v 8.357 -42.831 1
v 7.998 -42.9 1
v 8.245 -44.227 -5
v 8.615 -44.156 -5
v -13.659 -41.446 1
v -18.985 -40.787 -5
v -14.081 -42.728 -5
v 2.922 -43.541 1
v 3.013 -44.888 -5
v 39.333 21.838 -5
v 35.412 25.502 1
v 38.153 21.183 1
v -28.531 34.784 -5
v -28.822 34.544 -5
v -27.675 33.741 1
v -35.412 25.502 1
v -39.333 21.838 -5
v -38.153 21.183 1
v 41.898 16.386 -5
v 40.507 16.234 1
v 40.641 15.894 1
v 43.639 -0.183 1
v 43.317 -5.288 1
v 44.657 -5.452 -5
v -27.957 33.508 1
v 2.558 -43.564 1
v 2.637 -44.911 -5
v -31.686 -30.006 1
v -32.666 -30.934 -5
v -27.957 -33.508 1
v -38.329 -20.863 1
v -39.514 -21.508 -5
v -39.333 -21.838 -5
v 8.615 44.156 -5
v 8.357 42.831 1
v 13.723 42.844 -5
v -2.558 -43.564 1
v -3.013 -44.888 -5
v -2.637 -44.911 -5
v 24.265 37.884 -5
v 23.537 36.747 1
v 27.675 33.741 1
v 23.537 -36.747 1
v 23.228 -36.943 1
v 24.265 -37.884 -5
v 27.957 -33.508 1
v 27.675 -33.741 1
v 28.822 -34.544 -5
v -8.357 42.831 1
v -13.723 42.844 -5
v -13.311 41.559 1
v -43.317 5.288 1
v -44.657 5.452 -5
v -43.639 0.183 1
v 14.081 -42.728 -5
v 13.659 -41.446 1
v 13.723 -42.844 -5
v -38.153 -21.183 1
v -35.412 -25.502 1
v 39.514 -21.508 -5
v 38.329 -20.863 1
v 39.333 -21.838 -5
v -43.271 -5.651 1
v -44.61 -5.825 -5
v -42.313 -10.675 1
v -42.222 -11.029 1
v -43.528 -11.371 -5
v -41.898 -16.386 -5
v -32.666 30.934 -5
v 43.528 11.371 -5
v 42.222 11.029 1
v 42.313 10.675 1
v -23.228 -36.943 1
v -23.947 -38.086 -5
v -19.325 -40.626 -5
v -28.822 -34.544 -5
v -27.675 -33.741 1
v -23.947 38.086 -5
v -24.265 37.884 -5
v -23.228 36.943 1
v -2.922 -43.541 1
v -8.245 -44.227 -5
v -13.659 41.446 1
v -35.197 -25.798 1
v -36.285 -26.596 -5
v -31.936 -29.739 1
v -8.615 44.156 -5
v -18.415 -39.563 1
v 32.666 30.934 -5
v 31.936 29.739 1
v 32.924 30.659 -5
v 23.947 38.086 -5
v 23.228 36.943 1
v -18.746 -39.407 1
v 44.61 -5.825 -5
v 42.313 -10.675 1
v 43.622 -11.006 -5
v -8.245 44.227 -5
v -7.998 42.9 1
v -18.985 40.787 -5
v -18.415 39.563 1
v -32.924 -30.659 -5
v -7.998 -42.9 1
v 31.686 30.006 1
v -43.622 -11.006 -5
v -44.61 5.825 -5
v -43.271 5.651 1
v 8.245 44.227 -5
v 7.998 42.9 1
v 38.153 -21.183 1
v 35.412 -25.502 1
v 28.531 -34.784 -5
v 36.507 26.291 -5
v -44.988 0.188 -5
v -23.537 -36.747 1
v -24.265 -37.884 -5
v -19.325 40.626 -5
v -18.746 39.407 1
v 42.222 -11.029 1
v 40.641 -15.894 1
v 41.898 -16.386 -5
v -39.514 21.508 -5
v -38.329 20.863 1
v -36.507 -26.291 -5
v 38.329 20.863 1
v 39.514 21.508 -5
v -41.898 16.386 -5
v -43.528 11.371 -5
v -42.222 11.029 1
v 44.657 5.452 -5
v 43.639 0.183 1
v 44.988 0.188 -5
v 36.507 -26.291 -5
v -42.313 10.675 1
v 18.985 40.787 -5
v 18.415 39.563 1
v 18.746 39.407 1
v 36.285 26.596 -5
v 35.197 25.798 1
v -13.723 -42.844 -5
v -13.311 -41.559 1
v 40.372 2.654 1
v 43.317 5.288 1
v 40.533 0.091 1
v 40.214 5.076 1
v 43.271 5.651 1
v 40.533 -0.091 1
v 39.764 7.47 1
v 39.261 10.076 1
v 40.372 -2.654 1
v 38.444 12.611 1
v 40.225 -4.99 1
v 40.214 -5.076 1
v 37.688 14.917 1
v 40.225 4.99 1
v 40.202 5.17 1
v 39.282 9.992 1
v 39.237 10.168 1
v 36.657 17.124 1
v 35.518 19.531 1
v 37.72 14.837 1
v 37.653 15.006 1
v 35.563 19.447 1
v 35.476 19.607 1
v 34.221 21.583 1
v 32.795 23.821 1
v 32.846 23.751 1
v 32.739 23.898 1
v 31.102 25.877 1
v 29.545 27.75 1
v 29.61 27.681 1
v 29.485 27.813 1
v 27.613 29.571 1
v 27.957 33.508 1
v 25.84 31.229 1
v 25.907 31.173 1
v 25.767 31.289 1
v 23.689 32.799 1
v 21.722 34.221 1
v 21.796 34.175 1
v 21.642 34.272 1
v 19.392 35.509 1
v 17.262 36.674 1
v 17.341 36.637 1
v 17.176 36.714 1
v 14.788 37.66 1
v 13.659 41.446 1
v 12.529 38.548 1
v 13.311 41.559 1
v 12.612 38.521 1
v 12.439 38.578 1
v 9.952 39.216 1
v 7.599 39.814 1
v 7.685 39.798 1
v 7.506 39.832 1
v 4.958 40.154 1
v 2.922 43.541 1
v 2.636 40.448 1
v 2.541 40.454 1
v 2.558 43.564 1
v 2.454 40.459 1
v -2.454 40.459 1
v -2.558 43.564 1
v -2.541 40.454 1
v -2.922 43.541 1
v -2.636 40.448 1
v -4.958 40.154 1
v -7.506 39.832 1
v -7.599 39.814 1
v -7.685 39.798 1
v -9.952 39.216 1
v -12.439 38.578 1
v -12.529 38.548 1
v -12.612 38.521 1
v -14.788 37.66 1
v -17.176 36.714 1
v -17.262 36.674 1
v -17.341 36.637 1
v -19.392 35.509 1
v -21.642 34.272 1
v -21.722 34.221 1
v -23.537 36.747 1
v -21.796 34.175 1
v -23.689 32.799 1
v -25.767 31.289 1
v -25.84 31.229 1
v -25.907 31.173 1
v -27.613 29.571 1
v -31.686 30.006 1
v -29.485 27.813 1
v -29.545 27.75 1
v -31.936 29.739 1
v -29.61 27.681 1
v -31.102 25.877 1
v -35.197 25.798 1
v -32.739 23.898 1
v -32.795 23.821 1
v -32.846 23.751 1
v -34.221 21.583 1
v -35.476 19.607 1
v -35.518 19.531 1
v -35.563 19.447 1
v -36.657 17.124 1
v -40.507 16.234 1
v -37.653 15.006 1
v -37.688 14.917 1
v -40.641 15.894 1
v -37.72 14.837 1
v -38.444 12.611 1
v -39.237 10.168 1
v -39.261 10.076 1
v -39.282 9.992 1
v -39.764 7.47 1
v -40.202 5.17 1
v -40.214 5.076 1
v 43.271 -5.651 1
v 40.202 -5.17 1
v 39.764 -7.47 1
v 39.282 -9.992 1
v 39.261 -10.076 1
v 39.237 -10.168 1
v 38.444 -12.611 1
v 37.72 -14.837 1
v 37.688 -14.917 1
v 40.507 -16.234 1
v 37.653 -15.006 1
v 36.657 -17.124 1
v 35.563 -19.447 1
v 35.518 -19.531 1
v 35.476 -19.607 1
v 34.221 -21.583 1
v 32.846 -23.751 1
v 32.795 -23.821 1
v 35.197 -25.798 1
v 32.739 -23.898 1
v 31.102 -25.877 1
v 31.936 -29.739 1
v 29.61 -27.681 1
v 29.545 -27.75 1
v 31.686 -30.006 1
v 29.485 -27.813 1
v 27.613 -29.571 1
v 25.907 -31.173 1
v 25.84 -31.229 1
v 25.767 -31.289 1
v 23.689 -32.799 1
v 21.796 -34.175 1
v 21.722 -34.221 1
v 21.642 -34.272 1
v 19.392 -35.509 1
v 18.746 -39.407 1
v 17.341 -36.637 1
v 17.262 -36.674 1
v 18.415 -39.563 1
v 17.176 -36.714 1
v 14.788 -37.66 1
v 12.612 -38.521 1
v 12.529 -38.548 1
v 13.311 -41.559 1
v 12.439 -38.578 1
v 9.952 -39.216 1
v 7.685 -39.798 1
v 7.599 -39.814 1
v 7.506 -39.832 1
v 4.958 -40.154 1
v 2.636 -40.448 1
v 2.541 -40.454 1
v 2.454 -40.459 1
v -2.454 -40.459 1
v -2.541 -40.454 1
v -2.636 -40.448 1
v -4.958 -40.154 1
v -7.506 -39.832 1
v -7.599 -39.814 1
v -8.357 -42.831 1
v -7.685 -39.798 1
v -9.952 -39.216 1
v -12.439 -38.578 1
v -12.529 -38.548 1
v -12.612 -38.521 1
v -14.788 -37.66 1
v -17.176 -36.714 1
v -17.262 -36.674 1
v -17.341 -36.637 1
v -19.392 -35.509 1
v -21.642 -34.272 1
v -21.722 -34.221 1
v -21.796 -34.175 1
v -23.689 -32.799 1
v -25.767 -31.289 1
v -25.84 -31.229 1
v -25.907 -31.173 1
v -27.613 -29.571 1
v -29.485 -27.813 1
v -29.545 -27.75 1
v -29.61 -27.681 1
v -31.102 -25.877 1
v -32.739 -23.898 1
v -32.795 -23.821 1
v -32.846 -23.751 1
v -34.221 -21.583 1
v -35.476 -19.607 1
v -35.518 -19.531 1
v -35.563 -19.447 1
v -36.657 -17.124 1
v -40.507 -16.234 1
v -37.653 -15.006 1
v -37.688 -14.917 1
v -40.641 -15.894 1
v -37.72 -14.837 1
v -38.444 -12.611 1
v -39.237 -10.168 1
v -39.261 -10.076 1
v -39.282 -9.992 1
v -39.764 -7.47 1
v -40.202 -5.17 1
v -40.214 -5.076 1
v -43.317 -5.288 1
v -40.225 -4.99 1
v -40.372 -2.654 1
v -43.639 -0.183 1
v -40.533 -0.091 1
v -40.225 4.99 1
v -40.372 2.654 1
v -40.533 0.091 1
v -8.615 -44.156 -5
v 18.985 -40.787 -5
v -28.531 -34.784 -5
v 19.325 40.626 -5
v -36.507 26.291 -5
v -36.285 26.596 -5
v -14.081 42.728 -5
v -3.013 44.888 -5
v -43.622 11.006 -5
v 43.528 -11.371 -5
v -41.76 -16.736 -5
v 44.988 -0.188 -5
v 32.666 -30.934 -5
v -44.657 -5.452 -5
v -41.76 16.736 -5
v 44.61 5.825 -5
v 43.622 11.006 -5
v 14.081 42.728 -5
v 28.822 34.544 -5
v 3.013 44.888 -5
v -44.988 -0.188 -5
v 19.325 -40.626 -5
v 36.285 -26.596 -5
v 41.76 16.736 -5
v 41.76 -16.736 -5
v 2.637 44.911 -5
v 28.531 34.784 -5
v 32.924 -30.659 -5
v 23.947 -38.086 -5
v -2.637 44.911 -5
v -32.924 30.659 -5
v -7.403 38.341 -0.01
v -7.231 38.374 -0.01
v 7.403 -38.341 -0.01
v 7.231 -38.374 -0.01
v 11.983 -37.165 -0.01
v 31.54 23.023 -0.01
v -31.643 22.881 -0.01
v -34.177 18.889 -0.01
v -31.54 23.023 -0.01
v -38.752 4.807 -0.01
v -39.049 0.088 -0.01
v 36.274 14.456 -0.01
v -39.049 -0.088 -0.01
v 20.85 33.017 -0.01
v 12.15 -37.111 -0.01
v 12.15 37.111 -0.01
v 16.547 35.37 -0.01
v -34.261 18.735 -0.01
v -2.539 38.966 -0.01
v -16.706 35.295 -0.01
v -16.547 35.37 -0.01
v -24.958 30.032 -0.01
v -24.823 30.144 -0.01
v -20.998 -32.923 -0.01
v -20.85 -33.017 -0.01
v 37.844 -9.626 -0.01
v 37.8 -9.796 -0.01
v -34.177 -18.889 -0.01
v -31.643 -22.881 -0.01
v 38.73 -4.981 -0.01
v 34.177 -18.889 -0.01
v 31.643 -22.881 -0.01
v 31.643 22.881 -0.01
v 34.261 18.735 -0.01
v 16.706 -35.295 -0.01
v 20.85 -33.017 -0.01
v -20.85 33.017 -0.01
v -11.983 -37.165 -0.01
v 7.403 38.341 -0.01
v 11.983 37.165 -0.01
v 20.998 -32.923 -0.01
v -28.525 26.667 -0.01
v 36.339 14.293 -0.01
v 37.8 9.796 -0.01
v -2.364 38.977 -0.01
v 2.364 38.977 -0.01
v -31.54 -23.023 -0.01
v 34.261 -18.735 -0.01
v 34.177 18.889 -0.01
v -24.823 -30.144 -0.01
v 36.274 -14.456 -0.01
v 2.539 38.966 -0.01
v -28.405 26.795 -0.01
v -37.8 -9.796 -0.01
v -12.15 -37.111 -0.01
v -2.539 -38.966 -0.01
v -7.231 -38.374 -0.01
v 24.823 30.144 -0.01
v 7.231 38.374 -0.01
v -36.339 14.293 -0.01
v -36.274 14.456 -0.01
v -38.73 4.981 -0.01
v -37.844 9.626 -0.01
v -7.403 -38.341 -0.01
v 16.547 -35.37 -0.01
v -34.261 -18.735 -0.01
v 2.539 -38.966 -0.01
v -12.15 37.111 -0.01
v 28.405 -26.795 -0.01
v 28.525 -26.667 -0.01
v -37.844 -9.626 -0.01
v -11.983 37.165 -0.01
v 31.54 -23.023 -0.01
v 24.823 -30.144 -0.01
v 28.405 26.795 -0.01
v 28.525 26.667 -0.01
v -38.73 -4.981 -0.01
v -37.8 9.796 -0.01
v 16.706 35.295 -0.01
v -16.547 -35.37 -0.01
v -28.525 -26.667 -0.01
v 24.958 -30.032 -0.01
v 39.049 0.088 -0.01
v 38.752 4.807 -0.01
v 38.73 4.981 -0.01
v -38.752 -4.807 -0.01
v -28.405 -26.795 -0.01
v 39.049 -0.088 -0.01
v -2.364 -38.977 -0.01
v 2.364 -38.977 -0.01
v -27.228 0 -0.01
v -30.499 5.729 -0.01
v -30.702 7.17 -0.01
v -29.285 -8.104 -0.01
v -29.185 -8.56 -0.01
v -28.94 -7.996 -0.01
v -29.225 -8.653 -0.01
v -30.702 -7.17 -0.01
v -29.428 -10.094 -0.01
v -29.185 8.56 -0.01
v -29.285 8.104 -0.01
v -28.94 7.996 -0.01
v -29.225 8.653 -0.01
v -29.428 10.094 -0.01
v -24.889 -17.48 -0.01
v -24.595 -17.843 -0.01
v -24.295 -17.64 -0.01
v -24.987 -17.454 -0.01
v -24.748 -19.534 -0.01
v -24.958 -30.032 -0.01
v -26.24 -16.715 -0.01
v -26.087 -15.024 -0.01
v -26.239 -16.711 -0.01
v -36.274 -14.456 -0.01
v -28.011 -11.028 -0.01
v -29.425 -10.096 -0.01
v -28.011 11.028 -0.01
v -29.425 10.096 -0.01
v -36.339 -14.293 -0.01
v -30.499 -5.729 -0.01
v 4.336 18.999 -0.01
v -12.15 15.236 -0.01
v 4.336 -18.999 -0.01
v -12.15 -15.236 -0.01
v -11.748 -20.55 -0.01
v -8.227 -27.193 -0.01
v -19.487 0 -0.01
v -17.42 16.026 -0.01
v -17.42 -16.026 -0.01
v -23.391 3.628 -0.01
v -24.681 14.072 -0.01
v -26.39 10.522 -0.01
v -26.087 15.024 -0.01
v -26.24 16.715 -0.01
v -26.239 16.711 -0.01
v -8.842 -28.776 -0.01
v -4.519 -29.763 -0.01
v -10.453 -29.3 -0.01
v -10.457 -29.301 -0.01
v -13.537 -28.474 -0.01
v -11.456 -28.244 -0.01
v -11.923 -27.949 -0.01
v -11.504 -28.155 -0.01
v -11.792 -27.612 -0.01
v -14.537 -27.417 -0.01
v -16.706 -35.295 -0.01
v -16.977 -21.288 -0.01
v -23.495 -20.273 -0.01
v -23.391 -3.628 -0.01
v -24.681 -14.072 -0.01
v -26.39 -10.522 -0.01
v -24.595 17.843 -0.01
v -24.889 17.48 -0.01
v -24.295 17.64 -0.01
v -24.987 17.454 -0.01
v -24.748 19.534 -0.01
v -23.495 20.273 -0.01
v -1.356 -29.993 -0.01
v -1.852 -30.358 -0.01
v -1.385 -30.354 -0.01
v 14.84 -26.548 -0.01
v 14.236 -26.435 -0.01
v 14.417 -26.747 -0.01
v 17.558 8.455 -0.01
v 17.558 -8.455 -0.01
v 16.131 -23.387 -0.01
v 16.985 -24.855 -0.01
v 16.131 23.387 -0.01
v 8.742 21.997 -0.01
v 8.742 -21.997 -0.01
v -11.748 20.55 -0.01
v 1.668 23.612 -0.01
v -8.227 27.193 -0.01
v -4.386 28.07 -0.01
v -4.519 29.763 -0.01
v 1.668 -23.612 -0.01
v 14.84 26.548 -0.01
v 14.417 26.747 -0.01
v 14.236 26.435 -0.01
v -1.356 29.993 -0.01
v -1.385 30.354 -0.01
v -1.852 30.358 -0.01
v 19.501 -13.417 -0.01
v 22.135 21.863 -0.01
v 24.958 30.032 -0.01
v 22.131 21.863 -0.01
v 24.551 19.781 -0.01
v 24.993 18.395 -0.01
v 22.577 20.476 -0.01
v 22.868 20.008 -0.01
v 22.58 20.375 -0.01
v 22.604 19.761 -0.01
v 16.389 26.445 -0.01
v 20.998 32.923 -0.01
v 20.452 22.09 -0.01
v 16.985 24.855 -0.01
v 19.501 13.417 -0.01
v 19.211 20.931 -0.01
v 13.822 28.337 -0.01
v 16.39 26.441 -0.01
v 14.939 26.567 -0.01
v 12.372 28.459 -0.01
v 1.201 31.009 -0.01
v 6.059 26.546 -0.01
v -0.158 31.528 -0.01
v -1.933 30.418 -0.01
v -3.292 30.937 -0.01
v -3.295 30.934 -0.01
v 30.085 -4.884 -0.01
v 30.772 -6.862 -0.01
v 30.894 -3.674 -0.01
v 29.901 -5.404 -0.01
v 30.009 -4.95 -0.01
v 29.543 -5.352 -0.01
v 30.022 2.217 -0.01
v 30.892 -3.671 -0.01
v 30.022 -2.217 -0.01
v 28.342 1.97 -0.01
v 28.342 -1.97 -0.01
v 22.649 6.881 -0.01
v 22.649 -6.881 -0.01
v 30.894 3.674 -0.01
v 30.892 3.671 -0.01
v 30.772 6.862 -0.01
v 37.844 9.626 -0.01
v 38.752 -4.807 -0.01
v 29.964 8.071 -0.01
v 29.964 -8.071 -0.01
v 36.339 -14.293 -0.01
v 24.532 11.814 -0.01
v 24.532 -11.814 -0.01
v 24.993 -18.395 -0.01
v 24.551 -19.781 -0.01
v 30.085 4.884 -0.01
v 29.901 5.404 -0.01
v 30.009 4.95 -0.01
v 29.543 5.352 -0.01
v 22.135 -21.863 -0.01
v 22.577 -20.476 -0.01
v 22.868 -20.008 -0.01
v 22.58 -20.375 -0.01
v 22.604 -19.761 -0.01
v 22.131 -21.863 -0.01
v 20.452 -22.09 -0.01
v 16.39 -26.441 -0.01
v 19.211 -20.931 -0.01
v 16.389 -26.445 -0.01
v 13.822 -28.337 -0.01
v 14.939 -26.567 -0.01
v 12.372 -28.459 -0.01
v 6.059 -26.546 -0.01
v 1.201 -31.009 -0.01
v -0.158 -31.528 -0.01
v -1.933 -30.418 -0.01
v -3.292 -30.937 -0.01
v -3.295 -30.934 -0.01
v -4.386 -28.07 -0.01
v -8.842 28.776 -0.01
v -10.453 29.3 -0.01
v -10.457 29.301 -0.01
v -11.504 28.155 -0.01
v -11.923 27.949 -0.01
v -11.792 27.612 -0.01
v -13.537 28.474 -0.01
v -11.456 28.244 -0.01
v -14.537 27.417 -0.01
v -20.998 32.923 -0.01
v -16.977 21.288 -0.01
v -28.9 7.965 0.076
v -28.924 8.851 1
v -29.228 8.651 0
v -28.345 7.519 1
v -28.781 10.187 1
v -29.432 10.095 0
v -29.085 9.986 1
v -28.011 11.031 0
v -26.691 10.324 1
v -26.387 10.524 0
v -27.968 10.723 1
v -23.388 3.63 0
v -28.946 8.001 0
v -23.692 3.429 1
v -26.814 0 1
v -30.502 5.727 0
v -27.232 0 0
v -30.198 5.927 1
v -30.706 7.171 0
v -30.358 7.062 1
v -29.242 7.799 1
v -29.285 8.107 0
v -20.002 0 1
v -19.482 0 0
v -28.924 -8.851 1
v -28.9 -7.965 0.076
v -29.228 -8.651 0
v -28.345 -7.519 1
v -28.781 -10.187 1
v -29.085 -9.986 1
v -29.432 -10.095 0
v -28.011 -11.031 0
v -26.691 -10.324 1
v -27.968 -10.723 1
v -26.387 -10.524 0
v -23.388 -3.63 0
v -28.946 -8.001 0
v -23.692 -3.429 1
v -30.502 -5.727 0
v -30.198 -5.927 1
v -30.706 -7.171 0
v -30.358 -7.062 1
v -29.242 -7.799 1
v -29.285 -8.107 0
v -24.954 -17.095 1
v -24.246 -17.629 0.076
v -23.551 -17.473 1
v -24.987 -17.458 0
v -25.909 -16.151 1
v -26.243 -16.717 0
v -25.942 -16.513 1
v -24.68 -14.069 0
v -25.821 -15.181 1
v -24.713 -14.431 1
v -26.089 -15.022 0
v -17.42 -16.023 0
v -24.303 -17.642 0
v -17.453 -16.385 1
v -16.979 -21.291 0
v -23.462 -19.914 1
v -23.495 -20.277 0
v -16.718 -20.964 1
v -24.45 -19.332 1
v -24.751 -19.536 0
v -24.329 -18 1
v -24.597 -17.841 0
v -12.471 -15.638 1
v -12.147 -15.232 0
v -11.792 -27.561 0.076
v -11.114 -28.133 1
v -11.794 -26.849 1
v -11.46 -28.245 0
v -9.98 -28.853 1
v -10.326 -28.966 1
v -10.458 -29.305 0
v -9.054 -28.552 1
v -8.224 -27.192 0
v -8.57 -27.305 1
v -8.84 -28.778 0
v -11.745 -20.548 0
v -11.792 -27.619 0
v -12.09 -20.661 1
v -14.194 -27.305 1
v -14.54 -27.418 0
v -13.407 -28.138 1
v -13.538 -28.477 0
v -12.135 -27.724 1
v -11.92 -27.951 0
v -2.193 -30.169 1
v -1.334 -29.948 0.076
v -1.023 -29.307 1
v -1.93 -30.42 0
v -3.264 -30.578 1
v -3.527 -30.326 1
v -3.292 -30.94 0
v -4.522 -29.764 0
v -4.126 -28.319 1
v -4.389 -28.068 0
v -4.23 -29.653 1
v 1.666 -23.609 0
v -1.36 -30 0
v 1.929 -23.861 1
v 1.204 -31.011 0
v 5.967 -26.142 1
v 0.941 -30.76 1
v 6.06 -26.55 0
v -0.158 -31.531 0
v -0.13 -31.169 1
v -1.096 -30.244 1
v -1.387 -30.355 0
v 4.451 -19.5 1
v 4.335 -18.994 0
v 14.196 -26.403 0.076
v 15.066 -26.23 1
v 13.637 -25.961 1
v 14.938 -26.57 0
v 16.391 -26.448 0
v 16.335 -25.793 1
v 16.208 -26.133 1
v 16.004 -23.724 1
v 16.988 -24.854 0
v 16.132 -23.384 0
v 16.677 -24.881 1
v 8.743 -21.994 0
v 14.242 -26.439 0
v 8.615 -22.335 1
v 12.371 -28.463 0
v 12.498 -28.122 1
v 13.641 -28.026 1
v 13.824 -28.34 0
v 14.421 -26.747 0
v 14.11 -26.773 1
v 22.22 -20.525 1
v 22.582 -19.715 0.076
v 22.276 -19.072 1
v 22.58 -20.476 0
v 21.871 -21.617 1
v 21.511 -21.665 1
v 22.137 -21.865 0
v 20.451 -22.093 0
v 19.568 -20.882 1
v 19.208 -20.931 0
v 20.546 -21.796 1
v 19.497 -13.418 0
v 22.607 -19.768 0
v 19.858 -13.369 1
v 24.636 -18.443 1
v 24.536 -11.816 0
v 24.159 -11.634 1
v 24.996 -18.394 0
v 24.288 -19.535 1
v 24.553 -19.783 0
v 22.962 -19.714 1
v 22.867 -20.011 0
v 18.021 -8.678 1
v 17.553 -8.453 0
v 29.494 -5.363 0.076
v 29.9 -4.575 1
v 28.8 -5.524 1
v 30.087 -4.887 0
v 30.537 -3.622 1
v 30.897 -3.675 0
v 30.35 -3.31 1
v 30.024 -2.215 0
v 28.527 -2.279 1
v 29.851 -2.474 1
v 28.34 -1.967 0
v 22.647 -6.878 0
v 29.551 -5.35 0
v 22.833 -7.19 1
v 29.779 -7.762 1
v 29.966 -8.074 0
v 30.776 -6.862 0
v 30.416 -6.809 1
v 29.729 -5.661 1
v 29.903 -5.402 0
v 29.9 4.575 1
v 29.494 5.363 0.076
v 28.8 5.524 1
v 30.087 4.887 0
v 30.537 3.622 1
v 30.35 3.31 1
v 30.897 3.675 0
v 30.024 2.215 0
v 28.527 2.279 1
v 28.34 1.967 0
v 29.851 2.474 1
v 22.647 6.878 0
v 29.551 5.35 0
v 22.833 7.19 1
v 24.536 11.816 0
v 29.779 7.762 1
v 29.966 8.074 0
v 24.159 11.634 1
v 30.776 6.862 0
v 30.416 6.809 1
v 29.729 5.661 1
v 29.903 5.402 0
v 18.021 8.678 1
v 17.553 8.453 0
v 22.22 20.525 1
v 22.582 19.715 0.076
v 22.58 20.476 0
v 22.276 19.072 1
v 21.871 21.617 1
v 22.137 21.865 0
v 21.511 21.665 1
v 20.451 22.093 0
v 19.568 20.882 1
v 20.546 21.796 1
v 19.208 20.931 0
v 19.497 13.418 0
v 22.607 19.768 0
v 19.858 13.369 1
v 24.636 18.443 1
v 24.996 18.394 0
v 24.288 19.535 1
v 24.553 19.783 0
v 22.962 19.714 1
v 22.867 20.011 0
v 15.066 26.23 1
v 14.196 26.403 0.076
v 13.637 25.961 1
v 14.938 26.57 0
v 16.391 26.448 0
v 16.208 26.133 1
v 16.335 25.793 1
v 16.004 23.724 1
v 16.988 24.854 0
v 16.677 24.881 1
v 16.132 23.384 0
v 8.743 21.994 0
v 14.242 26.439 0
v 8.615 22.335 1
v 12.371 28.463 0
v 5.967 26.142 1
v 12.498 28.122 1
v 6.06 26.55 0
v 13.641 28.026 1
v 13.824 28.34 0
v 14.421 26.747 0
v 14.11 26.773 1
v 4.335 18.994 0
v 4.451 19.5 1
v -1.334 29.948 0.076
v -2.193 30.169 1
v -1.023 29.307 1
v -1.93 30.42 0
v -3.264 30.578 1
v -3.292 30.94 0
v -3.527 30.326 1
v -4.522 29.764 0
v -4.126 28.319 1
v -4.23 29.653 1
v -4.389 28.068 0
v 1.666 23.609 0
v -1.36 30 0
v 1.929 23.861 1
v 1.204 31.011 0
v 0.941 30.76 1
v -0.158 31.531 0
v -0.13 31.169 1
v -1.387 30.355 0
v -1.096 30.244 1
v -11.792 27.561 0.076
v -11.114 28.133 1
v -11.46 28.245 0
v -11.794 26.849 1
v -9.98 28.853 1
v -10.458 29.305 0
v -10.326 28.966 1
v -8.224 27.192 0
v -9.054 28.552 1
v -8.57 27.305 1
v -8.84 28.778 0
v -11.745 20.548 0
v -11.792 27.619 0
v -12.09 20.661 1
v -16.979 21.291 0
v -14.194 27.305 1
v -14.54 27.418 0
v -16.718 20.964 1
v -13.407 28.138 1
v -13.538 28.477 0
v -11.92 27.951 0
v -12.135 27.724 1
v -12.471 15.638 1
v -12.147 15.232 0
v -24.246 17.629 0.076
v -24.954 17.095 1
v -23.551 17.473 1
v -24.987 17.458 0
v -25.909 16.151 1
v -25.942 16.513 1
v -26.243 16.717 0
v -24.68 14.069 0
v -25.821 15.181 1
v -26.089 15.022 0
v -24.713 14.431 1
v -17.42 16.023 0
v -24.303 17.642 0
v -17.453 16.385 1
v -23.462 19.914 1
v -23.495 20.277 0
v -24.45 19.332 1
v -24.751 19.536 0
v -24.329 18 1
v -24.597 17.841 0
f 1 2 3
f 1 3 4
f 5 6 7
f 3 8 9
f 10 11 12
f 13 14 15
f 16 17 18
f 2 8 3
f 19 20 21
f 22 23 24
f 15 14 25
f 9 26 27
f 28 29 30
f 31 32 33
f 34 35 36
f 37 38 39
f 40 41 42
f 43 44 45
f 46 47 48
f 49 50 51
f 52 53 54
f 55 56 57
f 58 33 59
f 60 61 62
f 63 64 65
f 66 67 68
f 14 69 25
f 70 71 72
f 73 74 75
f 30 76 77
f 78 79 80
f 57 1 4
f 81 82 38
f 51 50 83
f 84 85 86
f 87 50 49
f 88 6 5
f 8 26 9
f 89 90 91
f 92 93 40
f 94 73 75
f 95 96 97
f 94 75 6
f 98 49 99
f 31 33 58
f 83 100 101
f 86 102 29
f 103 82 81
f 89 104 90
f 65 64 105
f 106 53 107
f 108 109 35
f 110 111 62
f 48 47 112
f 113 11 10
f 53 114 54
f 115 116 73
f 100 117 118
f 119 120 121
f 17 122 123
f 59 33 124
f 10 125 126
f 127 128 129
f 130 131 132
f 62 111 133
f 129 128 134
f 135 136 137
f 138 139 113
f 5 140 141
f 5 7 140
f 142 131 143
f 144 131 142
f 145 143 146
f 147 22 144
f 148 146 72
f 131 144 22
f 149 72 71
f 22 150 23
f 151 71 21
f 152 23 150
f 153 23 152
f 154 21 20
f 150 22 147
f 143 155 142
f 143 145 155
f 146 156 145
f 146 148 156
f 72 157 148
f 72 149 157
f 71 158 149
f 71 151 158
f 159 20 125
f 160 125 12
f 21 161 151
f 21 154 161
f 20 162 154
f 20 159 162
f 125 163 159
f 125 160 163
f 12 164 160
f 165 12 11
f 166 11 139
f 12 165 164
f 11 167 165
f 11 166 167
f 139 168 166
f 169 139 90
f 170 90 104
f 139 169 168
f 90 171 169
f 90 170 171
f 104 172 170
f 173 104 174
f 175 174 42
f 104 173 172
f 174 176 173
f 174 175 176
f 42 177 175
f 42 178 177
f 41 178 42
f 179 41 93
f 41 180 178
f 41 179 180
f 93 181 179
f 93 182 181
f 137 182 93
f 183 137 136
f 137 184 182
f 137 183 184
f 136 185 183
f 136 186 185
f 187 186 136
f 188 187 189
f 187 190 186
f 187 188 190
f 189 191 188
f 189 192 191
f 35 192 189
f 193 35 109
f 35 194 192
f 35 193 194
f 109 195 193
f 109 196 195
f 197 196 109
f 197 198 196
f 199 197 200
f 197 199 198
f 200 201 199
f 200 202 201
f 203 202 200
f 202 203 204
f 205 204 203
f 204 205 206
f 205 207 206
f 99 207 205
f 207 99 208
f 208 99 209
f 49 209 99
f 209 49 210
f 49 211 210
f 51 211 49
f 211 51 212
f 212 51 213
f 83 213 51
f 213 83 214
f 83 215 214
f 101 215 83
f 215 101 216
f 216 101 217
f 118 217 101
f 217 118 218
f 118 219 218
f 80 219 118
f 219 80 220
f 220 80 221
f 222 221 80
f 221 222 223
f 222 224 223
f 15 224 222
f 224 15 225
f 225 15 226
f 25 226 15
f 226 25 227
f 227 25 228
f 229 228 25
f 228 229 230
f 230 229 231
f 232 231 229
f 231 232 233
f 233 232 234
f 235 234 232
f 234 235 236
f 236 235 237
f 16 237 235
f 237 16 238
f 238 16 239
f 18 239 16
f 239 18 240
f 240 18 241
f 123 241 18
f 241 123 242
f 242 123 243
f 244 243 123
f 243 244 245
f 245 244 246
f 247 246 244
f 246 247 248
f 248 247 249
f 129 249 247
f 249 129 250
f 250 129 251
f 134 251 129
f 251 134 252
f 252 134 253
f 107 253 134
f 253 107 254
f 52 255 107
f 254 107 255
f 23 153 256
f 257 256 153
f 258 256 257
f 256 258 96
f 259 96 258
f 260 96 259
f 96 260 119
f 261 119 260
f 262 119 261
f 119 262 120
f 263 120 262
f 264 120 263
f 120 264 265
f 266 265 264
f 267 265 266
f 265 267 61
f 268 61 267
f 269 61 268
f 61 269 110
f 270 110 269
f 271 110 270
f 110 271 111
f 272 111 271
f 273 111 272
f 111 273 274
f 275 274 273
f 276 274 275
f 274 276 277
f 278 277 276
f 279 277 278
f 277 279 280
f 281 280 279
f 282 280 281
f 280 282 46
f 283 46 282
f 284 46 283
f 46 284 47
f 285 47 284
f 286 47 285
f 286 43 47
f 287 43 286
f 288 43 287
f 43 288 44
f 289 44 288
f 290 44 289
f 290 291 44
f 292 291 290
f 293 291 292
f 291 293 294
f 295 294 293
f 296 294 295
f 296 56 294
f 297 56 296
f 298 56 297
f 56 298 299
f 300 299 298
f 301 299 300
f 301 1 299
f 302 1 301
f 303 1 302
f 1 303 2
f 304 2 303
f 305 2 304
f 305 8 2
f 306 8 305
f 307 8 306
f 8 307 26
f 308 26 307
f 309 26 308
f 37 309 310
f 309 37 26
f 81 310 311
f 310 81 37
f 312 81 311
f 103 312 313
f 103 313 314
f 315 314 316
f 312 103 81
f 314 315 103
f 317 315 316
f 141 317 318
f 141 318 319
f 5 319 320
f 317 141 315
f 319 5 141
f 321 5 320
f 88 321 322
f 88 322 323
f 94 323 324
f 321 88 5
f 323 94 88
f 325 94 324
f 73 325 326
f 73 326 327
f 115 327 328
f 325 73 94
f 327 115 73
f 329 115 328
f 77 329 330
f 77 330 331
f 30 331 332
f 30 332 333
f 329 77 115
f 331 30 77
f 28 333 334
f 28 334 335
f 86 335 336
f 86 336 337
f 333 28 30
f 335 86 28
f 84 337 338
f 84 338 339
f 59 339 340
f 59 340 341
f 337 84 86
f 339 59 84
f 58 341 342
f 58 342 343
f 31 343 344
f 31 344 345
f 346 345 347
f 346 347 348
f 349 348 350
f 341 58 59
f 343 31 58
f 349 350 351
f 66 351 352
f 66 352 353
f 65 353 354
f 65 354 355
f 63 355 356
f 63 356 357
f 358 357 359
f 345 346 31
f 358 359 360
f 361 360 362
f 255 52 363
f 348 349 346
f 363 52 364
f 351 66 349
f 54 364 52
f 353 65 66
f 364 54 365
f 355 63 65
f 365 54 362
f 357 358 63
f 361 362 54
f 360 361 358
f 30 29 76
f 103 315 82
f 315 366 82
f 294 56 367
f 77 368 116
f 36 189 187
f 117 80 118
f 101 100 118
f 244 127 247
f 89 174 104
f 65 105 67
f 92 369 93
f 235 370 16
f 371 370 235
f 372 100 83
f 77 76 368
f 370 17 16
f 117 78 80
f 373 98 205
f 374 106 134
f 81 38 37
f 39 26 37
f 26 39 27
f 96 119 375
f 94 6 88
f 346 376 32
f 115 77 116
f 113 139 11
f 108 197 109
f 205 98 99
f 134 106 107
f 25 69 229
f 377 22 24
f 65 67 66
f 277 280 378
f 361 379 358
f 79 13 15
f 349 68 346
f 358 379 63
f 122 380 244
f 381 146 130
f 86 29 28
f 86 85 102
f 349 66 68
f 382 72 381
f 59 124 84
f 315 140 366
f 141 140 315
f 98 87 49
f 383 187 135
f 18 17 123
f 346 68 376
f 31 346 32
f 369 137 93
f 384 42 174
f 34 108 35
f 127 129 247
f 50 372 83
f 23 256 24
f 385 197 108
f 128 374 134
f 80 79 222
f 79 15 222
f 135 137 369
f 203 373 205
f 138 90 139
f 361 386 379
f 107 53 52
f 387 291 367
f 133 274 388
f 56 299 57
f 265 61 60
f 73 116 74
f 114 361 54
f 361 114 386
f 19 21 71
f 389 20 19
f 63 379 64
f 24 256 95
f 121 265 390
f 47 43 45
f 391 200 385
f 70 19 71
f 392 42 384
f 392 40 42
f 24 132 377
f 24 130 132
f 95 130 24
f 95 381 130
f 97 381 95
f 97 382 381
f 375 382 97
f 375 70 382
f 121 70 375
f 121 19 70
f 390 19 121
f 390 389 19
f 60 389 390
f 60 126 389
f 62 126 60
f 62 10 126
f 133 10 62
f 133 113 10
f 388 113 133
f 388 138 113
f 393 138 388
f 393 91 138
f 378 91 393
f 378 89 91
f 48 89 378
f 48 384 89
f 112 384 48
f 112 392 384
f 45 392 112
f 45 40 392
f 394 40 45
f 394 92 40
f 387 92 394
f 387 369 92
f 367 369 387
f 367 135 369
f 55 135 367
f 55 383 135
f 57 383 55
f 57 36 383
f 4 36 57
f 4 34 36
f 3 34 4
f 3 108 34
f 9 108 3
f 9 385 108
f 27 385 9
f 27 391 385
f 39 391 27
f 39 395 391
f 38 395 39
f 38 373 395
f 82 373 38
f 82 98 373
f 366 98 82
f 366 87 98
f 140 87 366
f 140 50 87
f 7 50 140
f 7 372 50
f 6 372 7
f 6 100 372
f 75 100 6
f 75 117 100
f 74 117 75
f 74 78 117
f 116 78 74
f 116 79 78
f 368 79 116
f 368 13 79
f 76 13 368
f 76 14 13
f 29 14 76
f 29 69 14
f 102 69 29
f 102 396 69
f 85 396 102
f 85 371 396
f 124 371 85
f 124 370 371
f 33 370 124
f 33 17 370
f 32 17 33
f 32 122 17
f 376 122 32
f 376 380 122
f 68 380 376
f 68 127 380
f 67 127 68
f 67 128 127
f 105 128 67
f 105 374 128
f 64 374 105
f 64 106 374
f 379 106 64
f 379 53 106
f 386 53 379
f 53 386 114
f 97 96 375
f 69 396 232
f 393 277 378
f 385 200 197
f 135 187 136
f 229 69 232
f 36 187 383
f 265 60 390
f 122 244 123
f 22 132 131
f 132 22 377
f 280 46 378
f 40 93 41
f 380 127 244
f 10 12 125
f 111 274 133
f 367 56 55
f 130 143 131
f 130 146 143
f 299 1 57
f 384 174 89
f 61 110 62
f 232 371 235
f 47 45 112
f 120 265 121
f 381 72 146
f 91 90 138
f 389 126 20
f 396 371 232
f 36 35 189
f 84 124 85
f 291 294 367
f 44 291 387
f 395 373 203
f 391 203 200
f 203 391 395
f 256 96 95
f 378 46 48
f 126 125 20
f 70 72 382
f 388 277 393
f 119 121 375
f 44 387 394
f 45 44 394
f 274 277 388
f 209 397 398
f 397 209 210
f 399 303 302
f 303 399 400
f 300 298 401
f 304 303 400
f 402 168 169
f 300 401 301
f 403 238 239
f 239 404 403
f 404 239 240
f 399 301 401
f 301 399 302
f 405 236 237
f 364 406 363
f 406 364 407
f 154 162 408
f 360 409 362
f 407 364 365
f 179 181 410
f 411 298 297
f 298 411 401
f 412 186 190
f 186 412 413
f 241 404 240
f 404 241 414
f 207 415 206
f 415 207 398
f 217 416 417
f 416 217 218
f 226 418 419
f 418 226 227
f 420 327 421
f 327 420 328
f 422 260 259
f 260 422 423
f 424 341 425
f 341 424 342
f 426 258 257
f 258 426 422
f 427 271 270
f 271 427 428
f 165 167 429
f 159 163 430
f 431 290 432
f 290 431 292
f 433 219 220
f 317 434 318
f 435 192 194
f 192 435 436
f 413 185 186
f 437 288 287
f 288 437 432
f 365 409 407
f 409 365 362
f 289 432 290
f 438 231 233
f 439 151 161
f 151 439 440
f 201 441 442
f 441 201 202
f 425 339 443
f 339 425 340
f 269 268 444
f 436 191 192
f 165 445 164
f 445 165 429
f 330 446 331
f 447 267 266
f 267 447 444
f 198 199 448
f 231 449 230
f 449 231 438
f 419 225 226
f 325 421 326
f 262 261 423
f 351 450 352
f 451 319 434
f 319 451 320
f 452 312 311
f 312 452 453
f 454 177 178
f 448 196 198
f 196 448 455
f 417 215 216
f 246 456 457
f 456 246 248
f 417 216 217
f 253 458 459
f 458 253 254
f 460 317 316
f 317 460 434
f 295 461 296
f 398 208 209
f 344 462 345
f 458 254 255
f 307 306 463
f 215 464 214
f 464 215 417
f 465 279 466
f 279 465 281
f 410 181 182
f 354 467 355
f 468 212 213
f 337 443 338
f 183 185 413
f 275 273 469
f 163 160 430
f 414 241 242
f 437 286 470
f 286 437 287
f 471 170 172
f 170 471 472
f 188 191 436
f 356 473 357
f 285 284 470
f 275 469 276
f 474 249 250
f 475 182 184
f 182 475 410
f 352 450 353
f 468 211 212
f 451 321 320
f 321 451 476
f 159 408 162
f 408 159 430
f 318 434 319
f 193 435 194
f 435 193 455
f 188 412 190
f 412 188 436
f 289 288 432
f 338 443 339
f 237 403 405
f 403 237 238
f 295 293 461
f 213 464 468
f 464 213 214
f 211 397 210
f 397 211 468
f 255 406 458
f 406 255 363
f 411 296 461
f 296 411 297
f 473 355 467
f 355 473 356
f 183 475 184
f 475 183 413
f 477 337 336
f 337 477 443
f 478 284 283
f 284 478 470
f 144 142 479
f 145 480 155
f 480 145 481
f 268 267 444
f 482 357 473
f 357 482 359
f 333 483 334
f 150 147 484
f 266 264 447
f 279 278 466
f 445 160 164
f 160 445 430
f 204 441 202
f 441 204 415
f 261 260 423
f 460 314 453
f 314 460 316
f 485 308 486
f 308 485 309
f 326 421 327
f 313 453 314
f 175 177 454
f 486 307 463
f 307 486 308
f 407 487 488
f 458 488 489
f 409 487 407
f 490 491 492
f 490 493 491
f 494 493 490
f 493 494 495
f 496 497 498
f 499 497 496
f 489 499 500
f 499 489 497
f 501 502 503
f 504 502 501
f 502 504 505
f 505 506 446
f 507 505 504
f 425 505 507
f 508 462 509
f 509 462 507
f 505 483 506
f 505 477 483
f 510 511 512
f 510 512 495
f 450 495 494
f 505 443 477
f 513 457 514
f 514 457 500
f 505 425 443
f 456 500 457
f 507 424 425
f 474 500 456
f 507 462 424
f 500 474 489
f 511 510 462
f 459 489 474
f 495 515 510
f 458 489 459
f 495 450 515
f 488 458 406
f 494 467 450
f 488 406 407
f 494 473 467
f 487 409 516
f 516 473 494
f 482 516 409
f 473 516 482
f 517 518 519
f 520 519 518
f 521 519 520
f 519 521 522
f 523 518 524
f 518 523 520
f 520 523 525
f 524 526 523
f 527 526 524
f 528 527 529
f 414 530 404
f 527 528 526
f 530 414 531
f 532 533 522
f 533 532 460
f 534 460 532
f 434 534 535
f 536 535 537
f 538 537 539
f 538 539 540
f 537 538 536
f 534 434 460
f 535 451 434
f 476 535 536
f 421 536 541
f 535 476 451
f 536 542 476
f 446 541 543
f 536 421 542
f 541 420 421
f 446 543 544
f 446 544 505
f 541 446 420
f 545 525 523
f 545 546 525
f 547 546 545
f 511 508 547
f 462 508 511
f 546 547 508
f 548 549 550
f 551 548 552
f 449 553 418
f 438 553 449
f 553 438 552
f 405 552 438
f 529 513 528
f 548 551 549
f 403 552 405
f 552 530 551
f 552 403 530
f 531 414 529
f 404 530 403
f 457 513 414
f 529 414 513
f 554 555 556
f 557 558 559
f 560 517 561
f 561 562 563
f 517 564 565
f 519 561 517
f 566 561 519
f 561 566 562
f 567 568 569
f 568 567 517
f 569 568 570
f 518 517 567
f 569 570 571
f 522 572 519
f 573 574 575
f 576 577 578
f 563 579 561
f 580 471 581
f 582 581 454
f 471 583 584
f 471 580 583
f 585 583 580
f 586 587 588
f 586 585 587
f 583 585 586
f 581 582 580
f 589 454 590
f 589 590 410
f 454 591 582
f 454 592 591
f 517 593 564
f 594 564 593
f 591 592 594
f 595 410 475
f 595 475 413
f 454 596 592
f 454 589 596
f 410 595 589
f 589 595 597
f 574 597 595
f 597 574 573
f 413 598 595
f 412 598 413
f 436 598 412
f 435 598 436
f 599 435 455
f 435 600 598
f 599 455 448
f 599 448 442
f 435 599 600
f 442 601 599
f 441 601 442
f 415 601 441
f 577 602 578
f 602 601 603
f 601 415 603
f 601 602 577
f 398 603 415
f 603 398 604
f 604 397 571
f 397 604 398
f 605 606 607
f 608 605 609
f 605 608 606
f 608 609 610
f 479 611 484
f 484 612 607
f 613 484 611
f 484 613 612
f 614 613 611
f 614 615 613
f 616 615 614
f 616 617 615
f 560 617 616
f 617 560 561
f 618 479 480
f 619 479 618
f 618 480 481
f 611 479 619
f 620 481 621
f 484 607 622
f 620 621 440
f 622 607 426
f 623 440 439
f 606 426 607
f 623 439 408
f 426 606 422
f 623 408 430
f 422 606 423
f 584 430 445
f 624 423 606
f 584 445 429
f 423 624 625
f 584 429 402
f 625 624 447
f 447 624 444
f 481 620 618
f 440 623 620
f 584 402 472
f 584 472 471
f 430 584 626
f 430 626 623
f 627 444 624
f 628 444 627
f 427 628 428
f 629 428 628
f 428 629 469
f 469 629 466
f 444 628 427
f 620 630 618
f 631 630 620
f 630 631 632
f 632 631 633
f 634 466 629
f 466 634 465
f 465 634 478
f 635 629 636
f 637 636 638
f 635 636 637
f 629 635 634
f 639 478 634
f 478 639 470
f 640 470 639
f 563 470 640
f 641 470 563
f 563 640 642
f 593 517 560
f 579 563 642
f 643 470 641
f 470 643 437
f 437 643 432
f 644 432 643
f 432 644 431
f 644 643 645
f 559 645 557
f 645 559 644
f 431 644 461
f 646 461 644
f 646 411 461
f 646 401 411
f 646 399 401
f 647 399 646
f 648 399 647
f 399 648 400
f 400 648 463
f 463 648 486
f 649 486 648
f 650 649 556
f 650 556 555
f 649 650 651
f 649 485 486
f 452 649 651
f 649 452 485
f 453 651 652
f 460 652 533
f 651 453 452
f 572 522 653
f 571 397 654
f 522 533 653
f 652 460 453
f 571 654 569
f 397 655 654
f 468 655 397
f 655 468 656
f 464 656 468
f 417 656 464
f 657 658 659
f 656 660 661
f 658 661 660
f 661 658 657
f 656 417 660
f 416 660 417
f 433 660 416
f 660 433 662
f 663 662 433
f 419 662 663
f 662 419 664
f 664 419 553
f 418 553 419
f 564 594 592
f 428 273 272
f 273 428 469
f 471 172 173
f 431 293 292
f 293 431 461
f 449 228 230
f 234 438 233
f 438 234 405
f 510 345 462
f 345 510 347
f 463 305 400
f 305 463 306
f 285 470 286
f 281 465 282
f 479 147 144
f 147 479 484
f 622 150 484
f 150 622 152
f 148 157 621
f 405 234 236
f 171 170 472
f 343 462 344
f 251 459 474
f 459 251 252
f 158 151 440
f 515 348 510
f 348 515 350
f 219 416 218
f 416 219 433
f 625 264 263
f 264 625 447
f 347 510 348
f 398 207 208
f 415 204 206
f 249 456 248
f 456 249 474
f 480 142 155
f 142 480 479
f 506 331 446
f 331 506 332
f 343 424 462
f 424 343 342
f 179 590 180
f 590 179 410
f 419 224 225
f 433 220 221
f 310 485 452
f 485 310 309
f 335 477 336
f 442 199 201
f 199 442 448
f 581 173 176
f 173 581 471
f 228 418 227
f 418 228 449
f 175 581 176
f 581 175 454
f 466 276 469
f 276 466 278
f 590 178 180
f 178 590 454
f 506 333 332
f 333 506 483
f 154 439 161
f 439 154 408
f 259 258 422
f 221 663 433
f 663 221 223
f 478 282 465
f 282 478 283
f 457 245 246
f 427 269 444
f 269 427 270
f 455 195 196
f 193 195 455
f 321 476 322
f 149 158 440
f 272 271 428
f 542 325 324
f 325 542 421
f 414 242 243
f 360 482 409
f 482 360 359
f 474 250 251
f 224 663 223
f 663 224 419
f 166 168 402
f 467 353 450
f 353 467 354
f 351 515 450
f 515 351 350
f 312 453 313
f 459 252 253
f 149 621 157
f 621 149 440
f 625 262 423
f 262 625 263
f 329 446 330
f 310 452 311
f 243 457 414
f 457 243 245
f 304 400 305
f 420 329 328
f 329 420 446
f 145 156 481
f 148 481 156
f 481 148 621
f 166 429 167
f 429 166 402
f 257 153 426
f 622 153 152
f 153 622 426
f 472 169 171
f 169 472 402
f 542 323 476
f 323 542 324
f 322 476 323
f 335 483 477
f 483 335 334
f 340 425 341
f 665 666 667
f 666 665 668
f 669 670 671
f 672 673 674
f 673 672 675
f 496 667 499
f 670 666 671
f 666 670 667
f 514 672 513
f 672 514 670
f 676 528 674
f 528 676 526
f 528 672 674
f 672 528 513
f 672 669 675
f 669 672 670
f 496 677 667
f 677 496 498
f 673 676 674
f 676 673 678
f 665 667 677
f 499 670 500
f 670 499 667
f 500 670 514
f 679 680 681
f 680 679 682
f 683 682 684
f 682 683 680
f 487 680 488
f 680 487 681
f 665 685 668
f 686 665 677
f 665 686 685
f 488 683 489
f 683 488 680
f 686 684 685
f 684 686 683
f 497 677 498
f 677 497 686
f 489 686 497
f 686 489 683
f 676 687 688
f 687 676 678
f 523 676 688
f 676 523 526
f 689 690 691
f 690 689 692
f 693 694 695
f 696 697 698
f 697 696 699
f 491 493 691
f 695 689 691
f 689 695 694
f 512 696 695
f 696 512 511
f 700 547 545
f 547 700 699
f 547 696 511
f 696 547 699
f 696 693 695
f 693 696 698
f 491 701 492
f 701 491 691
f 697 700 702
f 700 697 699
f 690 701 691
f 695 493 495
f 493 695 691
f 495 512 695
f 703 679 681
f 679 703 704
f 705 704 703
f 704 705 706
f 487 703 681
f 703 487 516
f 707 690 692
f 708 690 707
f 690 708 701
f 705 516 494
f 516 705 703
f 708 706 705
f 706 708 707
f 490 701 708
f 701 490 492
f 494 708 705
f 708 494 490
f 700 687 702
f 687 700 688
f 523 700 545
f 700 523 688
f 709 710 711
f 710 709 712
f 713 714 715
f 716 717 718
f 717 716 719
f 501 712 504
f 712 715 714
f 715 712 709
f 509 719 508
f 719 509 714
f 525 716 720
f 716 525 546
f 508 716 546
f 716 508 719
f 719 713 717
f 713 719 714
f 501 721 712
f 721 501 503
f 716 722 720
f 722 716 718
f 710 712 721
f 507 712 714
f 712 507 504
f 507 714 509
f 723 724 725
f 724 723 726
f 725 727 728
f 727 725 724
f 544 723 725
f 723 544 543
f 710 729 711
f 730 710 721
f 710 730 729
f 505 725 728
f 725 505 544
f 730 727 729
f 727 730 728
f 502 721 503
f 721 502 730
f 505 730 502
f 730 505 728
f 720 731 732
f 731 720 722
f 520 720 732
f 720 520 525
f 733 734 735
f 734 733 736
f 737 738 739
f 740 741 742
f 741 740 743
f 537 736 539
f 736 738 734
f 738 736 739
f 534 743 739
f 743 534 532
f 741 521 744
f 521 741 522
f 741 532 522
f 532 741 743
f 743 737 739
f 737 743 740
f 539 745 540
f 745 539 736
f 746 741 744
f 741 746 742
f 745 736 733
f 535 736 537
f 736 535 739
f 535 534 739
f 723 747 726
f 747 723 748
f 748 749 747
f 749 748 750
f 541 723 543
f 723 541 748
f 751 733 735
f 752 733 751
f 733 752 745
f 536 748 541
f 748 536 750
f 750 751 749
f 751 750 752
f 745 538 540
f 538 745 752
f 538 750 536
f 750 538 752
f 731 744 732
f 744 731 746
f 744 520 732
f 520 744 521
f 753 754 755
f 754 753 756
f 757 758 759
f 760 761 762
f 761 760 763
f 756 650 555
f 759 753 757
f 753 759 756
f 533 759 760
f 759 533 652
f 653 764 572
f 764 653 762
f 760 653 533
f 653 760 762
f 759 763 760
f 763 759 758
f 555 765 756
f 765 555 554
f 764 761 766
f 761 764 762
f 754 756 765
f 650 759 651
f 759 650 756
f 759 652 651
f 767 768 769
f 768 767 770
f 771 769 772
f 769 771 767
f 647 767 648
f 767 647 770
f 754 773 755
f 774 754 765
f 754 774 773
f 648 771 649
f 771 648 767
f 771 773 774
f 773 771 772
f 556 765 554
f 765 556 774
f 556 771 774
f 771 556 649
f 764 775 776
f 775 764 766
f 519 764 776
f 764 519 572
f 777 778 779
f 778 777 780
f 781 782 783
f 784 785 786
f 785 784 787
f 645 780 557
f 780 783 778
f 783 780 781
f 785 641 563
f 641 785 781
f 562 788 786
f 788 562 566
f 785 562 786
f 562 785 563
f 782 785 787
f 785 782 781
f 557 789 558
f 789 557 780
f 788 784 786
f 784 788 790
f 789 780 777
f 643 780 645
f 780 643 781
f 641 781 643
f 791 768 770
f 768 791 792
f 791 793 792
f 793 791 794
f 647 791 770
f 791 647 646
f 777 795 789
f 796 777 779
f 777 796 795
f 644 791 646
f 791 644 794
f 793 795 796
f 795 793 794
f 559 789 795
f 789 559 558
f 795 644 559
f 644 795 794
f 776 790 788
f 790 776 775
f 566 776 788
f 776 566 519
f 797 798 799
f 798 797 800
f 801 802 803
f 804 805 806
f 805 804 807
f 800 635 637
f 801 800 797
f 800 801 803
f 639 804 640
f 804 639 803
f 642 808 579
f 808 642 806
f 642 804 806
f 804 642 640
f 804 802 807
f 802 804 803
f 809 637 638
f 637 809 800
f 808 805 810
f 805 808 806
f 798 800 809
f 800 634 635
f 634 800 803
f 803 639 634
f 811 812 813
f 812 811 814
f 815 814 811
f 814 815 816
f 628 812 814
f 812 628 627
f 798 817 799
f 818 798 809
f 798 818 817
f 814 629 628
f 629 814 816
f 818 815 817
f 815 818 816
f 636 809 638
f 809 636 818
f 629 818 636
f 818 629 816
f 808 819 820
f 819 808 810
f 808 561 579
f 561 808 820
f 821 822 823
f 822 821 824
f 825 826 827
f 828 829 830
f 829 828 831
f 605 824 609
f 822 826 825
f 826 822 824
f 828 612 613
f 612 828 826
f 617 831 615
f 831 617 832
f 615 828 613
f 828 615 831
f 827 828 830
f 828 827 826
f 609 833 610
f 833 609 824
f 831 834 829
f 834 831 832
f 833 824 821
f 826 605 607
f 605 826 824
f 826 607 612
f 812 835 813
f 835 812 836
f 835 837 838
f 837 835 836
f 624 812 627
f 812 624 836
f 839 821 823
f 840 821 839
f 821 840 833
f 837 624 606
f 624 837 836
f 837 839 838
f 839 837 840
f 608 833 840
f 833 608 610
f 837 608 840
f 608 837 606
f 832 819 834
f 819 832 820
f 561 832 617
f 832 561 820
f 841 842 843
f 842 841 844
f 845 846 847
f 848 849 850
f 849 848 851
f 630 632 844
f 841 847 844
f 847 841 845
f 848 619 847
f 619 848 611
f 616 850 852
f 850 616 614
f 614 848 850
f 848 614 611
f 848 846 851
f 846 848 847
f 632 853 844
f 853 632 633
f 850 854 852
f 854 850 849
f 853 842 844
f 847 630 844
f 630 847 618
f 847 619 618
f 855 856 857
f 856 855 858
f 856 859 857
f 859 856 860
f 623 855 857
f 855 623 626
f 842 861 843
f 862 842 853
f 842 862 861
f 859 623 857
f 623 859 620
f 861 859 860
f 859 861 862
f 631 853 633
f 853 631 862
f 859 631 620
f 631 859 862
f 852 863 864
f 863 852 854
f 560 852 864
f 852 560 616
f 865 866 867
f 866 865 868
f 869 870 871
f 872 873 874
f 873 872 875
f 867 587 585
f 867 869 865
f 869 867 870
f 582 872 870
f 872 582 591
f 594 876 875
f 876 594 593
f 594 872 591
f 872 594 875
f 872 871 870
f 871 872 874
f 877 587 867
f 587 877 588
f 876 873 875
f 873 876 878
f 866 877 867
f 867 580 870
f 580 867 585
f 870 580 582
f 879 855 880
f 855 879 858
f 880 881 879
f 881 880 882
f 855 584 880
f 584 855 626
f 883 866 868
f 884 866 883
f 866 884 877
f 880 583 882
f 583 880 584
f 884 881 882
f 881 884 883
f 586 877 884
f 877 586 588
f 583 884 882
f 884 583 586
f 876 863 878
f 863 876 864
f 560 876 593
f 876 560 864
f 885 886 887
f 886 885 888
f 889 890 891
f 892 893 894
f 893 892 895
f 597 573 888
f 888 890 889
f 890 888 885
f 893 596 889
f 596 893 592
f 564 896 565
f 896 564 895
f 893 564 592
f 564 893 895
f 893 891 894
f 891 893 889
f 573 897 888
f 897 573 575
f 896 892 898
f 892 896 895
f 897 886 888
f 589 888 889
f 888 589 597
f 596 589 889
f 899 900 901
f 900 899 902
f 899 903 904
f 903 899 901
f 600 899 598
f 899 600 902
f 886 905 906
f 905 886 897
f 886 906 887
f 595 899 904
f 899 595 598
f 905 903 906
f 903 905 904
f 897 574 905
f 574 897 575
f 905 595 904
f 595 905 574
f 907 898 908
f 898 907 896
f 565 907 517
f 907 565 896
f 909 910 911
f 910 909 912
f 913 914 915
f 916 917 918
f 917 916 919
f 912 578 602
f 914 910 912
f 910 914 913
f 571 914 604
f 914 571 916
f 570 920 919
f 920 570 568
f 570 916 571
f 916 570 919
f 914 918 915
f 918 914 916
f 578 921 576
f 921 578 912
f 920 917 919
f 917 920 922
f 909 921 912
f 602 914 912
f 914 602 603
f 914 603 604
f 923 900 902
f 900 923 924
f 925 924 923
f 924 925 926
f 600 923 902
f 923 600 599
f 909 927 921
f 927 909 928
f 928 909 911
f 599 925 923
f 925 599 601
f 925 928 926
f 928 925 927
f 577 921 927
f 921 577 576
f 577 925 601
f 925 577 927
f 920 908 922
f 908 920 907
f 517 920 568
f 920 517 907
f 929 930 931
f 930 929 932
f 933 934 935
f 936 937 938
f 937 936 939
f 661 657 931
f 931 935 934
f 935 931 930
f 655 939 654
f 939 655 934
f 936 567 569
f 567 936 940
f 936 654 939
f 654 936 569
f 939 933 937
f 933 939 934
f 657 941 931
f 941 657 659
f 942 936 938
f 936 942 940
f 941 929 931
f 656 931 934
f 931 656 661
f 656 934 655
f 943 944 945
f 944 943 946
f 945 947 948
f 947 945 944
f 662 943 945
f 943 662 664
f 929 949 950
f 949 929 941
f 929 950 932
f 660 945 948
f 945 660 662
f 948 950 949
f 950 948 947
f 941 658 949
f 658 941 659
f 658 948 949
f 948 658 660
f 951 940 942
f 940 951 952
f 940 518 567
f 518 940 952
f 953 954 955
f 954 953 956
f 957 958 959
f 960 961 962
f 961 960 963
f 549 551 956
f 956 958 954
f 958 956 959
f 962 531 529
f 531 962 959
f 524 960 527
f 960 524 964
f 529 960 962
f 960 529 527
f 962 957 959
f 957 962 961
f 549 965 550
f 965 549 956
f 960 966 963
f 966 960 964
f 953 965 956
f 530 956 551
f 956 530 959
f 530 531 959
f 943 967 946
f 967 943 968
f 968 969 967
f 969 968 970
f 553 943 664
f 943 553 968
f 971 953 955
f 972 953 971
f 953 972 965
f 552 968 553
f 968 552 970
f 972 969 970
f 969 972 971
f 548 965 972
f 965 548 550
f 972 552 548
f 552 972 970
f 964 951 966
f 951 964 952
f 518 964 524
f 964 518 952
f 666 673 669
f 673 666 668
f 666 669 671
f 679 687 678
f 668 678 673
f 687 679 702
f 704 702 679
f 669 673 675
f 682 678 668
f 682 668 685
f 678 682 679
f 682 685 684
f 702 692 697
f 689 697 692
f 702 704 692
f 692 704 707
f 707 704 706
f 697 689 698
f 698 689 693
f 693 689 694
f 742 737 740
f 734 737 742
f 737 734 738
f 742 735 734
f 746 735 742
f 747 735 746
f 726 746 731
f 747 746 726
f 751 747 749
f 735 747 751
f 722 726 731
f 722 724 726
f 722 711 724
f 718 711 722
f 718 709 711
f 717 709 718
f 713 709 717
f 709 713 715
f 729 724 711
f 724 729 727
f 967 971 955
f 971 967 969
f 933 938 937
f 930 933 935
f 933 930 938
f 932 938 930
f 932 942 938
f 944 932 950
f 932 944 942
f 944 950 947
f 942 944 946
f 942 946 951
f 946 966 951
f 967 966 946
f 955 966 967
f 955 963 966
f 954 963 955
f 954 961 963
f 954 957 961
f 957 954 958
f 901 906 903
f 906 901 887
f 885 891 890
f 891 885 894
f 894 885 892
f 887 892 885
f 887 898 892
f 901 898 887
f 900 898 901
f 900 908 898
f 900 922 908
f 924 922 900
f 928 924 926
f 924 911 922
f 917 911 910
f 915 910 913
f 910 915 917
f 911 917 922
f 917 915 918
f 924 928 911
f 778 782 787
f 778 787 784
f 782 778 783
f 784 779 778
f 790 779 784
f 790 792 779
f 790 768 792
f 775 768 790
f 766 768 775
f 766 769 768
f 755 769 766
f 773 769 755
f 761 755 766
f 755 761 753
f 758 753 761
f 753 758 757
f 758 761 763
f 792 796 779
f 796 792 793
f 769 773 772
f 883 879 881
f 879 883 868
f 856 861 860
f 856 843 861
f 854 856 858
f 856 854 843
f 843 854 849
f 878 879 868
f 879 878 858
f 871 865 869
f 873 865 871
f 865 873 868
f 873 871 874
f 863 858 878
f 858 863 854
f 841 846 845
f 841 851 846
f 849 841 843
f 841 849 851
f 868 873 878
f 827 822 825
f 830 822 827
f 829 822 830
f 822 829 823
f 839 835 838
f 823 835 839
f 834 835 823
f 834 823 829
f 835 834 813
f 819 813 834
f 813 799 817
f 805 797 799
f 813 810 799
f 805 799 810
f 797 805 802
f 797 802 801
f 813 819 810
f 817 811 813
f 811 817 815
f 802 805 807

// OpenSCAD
Seed=6547648057;//
Seeded=0;//[1,0]

Oscale=[0.9,0.9];//
plate=45;//
thickness=5;
/*[Hidden]*/
baser=rnd(Seed+1,1.4,2);
phase=rnd(Seed+2,360);

mag1=rnd(Seed+3,6)*baser;
rep1=round(rnd(Seed+4,0,8));
ophase1=rnd(Seed+5,360);

mag2=rnd(Seed+6,6)*baser;
rep2=round(rnd(Seed+7,3,10));
ophase2=rnd(Seed+8,360);

phase0=rnd(Seed+9,360);
r0=rnd(Seed+10,0,1);
phase1=rnd(Seed+1,360);
r1=rnd(Seed+11,0,1)/2;
phase2=rnd(Seed+1,360);
r2=rnd(Seed+12,0,1)/3;
phase3=rnd(Seed+1,360);
r3=rnd(Seed+13,0,1)/4;
phase8=rnd(Seed+1,360);
r8=rnd(Seed+14,0,1)/8;
rsym1=round(rnd(Seed+15,1,8));
rsym2=round(rnd(Seed+16,0,rnd(Seed+16,16)));
msym1=round(rnd(Seed+17,0,rsym1));
msym2=round(rnd(Seed+18,0,rsym2));
rsum=baser+r0+r1+r2+r3+r8;
step=24*rsym1;
d=rnd(Seed+19,360);
e=rnd(Seed+20,-0.1,0.1);

dir=[rnd(Seed+21,-0,-0.5,Seed-23),0.5,0]*10;
golds=["DarkGoldenrod","Goldenrod"];
difference(){
color("DarkGoldenrod")translate([0,0,-thickness]) linear_extrude(height = thickness +1,  convexity = 10, scale=0.97,$fn=50)offset(r=3, chamfer=true)offset(r=-3, chamfer=false) circle(plate,center=true);
color("Goldenrod")mirror([0,0,1])translate([0,0,-1.99]) linear_extrude(height = 2,  convexity = 10, scale=0.93,$fn=50)offset(delta=3, chamfer=true)offset(r=-6, chamfer=false) circle(plate,center=true);
}

up=[0,0,-2];
intersection(){
color("DarkGoldenrod")translate([0,0,-thickness]) linear_extrude(height = thickness +1,  convexity = 10, scale=0.97,$fn=50)offset(r=3, chamfer=true)offset(r=-3, chamfer=false) circle(plate,center=true);

color("DarkGoldenrod")translate([0,0,0]) scale([Oscale[0]*plate,Oscale[1]*plate,30]) symmetries(rsym1,msym1){translate([-0.7+0.7/rsym1,0,0])rotate([0,0,d])scale([0.3+0.7/rsym1,e+0.3+0.7/rsym1,1])symmetries(rsym2,msym2){it ();};
}
}
//symmetries(rsym2,msym2){it ();}
module symmetries(rsym,msym){
for(j=[0:360/rsym:360])rotate([0,0,j]){
intersection(){
if(msym==0) children ();else union(){
    intersection(){
    children ();
    translate([-1,0,-0.05])scale([2,1,0.2])cube(1);
    }
    mirror([0,1,0]) intersection(){
    children ();
    translate([-1,0,-0.05])scale([2,1,0.2])cube(1);
    }}

if(rsym>1){intersection(){
rotate ([0,0,(360/rsym)*0.5])translate([-1,0,-0.05])scale([2,1,0.2])cube(1);
mirror([0,1,0])rotate ([0,0,(360/rsym)*0.5])translate([-1,0,-0.05])scale([2,1,0.2])cube(1);
}}else {scale([1,1,0.2])cube(2,center=true);
}
}}}

module it(){
cube(0.03,$fn=10);
for(i=[0:step:360]){hull(){
theta = i+ sin((i+ophase1)*rep1)*mag1+ sin((i+ophase2)*rep2)*mag2;
translate([
sin(theta+phase)*(baser+sin((i+phase0))*r0 +sin((i+phase1)*2)*r1+sin((i+phase2)*3)*r2+sin((i+phase3)*4)*r3+sin((i+phase8)*8)*r8)/rsum
,
cos(theta+phase)*(baser+sin((i+phase0))*r0+sin((i+phase1)*2)*r1+sin((i+phase2)*3)*r2+sin((i+phase3)*4)*r3+sin((i+phase8)*8)*r8)/rsum
,0

])sphere(0.09,$fn=6 );
ii=(i+step)%360;
theta2 = ii+ sin((ii+ophase1)*rep1)*mag1+ sin((ii+ophase2)*rep2)*mag2;
translate([
sin(theta2+phase)*(baser+sin((ii+phase0))*r0 +sin((ii+phase1)*2)*r1+sin((ii+phase2)*3)*r2+sin((ii+phase3)*4)*r3+sin((ii+phase8)*8)*r8)/rsum
,
cos(theta2+phase)*(baser+sin((ii+phase0))*r0+sin((ii+phase1)*2)*r1+sin((ii+phase2)*3)*r2+sin((ii+phase3)*4)*r3+sin((ii+phase8)*8)*r8)/rsum
,0

])sphere(0.09,$fn=6 );
}}}

 
function rndR()=[rands(0,360,1)[0],rands(0,360,1)[1],rands(0,360,1)[0]];

function un(v)=v/max(len3(v),0.000001)*1;
function p2n(pa,pb,pc)=
let(u=pa-pb,v=pa-pc)un([u[1]*v[2]-u[2]*v[1],u[2]*v[0]-u[0]*v[2],u[0]*v[1]-u[1]*v[0]]);
function avrg(v)=sumv(v,max(0,len(v)-1))/len(v);
function lerp(start,end,bias)=(end*bias+start*(1-bias));
function len3(v)=len(v)==2?sqrt(pow(v[0],2)+pow(v[1],2)):sqrt(pow(v[0],2)+pow(v[1],2)+pow(v[2],2));
function sumv(v,i,s=0)=(i==s?v[i]:v[i]+sumv(v,i-1,s));
function rnd(S,a=0,b=1)=Seeded==1?(rands(min(a,b),max(a,b),1,S)[0]):(rands(min(a,b),max(a,b),1)[0]);
function rndc()=[rands(0,1,1)[0],rands(0,1,1)[0],rands(0,1,1)[0]];
